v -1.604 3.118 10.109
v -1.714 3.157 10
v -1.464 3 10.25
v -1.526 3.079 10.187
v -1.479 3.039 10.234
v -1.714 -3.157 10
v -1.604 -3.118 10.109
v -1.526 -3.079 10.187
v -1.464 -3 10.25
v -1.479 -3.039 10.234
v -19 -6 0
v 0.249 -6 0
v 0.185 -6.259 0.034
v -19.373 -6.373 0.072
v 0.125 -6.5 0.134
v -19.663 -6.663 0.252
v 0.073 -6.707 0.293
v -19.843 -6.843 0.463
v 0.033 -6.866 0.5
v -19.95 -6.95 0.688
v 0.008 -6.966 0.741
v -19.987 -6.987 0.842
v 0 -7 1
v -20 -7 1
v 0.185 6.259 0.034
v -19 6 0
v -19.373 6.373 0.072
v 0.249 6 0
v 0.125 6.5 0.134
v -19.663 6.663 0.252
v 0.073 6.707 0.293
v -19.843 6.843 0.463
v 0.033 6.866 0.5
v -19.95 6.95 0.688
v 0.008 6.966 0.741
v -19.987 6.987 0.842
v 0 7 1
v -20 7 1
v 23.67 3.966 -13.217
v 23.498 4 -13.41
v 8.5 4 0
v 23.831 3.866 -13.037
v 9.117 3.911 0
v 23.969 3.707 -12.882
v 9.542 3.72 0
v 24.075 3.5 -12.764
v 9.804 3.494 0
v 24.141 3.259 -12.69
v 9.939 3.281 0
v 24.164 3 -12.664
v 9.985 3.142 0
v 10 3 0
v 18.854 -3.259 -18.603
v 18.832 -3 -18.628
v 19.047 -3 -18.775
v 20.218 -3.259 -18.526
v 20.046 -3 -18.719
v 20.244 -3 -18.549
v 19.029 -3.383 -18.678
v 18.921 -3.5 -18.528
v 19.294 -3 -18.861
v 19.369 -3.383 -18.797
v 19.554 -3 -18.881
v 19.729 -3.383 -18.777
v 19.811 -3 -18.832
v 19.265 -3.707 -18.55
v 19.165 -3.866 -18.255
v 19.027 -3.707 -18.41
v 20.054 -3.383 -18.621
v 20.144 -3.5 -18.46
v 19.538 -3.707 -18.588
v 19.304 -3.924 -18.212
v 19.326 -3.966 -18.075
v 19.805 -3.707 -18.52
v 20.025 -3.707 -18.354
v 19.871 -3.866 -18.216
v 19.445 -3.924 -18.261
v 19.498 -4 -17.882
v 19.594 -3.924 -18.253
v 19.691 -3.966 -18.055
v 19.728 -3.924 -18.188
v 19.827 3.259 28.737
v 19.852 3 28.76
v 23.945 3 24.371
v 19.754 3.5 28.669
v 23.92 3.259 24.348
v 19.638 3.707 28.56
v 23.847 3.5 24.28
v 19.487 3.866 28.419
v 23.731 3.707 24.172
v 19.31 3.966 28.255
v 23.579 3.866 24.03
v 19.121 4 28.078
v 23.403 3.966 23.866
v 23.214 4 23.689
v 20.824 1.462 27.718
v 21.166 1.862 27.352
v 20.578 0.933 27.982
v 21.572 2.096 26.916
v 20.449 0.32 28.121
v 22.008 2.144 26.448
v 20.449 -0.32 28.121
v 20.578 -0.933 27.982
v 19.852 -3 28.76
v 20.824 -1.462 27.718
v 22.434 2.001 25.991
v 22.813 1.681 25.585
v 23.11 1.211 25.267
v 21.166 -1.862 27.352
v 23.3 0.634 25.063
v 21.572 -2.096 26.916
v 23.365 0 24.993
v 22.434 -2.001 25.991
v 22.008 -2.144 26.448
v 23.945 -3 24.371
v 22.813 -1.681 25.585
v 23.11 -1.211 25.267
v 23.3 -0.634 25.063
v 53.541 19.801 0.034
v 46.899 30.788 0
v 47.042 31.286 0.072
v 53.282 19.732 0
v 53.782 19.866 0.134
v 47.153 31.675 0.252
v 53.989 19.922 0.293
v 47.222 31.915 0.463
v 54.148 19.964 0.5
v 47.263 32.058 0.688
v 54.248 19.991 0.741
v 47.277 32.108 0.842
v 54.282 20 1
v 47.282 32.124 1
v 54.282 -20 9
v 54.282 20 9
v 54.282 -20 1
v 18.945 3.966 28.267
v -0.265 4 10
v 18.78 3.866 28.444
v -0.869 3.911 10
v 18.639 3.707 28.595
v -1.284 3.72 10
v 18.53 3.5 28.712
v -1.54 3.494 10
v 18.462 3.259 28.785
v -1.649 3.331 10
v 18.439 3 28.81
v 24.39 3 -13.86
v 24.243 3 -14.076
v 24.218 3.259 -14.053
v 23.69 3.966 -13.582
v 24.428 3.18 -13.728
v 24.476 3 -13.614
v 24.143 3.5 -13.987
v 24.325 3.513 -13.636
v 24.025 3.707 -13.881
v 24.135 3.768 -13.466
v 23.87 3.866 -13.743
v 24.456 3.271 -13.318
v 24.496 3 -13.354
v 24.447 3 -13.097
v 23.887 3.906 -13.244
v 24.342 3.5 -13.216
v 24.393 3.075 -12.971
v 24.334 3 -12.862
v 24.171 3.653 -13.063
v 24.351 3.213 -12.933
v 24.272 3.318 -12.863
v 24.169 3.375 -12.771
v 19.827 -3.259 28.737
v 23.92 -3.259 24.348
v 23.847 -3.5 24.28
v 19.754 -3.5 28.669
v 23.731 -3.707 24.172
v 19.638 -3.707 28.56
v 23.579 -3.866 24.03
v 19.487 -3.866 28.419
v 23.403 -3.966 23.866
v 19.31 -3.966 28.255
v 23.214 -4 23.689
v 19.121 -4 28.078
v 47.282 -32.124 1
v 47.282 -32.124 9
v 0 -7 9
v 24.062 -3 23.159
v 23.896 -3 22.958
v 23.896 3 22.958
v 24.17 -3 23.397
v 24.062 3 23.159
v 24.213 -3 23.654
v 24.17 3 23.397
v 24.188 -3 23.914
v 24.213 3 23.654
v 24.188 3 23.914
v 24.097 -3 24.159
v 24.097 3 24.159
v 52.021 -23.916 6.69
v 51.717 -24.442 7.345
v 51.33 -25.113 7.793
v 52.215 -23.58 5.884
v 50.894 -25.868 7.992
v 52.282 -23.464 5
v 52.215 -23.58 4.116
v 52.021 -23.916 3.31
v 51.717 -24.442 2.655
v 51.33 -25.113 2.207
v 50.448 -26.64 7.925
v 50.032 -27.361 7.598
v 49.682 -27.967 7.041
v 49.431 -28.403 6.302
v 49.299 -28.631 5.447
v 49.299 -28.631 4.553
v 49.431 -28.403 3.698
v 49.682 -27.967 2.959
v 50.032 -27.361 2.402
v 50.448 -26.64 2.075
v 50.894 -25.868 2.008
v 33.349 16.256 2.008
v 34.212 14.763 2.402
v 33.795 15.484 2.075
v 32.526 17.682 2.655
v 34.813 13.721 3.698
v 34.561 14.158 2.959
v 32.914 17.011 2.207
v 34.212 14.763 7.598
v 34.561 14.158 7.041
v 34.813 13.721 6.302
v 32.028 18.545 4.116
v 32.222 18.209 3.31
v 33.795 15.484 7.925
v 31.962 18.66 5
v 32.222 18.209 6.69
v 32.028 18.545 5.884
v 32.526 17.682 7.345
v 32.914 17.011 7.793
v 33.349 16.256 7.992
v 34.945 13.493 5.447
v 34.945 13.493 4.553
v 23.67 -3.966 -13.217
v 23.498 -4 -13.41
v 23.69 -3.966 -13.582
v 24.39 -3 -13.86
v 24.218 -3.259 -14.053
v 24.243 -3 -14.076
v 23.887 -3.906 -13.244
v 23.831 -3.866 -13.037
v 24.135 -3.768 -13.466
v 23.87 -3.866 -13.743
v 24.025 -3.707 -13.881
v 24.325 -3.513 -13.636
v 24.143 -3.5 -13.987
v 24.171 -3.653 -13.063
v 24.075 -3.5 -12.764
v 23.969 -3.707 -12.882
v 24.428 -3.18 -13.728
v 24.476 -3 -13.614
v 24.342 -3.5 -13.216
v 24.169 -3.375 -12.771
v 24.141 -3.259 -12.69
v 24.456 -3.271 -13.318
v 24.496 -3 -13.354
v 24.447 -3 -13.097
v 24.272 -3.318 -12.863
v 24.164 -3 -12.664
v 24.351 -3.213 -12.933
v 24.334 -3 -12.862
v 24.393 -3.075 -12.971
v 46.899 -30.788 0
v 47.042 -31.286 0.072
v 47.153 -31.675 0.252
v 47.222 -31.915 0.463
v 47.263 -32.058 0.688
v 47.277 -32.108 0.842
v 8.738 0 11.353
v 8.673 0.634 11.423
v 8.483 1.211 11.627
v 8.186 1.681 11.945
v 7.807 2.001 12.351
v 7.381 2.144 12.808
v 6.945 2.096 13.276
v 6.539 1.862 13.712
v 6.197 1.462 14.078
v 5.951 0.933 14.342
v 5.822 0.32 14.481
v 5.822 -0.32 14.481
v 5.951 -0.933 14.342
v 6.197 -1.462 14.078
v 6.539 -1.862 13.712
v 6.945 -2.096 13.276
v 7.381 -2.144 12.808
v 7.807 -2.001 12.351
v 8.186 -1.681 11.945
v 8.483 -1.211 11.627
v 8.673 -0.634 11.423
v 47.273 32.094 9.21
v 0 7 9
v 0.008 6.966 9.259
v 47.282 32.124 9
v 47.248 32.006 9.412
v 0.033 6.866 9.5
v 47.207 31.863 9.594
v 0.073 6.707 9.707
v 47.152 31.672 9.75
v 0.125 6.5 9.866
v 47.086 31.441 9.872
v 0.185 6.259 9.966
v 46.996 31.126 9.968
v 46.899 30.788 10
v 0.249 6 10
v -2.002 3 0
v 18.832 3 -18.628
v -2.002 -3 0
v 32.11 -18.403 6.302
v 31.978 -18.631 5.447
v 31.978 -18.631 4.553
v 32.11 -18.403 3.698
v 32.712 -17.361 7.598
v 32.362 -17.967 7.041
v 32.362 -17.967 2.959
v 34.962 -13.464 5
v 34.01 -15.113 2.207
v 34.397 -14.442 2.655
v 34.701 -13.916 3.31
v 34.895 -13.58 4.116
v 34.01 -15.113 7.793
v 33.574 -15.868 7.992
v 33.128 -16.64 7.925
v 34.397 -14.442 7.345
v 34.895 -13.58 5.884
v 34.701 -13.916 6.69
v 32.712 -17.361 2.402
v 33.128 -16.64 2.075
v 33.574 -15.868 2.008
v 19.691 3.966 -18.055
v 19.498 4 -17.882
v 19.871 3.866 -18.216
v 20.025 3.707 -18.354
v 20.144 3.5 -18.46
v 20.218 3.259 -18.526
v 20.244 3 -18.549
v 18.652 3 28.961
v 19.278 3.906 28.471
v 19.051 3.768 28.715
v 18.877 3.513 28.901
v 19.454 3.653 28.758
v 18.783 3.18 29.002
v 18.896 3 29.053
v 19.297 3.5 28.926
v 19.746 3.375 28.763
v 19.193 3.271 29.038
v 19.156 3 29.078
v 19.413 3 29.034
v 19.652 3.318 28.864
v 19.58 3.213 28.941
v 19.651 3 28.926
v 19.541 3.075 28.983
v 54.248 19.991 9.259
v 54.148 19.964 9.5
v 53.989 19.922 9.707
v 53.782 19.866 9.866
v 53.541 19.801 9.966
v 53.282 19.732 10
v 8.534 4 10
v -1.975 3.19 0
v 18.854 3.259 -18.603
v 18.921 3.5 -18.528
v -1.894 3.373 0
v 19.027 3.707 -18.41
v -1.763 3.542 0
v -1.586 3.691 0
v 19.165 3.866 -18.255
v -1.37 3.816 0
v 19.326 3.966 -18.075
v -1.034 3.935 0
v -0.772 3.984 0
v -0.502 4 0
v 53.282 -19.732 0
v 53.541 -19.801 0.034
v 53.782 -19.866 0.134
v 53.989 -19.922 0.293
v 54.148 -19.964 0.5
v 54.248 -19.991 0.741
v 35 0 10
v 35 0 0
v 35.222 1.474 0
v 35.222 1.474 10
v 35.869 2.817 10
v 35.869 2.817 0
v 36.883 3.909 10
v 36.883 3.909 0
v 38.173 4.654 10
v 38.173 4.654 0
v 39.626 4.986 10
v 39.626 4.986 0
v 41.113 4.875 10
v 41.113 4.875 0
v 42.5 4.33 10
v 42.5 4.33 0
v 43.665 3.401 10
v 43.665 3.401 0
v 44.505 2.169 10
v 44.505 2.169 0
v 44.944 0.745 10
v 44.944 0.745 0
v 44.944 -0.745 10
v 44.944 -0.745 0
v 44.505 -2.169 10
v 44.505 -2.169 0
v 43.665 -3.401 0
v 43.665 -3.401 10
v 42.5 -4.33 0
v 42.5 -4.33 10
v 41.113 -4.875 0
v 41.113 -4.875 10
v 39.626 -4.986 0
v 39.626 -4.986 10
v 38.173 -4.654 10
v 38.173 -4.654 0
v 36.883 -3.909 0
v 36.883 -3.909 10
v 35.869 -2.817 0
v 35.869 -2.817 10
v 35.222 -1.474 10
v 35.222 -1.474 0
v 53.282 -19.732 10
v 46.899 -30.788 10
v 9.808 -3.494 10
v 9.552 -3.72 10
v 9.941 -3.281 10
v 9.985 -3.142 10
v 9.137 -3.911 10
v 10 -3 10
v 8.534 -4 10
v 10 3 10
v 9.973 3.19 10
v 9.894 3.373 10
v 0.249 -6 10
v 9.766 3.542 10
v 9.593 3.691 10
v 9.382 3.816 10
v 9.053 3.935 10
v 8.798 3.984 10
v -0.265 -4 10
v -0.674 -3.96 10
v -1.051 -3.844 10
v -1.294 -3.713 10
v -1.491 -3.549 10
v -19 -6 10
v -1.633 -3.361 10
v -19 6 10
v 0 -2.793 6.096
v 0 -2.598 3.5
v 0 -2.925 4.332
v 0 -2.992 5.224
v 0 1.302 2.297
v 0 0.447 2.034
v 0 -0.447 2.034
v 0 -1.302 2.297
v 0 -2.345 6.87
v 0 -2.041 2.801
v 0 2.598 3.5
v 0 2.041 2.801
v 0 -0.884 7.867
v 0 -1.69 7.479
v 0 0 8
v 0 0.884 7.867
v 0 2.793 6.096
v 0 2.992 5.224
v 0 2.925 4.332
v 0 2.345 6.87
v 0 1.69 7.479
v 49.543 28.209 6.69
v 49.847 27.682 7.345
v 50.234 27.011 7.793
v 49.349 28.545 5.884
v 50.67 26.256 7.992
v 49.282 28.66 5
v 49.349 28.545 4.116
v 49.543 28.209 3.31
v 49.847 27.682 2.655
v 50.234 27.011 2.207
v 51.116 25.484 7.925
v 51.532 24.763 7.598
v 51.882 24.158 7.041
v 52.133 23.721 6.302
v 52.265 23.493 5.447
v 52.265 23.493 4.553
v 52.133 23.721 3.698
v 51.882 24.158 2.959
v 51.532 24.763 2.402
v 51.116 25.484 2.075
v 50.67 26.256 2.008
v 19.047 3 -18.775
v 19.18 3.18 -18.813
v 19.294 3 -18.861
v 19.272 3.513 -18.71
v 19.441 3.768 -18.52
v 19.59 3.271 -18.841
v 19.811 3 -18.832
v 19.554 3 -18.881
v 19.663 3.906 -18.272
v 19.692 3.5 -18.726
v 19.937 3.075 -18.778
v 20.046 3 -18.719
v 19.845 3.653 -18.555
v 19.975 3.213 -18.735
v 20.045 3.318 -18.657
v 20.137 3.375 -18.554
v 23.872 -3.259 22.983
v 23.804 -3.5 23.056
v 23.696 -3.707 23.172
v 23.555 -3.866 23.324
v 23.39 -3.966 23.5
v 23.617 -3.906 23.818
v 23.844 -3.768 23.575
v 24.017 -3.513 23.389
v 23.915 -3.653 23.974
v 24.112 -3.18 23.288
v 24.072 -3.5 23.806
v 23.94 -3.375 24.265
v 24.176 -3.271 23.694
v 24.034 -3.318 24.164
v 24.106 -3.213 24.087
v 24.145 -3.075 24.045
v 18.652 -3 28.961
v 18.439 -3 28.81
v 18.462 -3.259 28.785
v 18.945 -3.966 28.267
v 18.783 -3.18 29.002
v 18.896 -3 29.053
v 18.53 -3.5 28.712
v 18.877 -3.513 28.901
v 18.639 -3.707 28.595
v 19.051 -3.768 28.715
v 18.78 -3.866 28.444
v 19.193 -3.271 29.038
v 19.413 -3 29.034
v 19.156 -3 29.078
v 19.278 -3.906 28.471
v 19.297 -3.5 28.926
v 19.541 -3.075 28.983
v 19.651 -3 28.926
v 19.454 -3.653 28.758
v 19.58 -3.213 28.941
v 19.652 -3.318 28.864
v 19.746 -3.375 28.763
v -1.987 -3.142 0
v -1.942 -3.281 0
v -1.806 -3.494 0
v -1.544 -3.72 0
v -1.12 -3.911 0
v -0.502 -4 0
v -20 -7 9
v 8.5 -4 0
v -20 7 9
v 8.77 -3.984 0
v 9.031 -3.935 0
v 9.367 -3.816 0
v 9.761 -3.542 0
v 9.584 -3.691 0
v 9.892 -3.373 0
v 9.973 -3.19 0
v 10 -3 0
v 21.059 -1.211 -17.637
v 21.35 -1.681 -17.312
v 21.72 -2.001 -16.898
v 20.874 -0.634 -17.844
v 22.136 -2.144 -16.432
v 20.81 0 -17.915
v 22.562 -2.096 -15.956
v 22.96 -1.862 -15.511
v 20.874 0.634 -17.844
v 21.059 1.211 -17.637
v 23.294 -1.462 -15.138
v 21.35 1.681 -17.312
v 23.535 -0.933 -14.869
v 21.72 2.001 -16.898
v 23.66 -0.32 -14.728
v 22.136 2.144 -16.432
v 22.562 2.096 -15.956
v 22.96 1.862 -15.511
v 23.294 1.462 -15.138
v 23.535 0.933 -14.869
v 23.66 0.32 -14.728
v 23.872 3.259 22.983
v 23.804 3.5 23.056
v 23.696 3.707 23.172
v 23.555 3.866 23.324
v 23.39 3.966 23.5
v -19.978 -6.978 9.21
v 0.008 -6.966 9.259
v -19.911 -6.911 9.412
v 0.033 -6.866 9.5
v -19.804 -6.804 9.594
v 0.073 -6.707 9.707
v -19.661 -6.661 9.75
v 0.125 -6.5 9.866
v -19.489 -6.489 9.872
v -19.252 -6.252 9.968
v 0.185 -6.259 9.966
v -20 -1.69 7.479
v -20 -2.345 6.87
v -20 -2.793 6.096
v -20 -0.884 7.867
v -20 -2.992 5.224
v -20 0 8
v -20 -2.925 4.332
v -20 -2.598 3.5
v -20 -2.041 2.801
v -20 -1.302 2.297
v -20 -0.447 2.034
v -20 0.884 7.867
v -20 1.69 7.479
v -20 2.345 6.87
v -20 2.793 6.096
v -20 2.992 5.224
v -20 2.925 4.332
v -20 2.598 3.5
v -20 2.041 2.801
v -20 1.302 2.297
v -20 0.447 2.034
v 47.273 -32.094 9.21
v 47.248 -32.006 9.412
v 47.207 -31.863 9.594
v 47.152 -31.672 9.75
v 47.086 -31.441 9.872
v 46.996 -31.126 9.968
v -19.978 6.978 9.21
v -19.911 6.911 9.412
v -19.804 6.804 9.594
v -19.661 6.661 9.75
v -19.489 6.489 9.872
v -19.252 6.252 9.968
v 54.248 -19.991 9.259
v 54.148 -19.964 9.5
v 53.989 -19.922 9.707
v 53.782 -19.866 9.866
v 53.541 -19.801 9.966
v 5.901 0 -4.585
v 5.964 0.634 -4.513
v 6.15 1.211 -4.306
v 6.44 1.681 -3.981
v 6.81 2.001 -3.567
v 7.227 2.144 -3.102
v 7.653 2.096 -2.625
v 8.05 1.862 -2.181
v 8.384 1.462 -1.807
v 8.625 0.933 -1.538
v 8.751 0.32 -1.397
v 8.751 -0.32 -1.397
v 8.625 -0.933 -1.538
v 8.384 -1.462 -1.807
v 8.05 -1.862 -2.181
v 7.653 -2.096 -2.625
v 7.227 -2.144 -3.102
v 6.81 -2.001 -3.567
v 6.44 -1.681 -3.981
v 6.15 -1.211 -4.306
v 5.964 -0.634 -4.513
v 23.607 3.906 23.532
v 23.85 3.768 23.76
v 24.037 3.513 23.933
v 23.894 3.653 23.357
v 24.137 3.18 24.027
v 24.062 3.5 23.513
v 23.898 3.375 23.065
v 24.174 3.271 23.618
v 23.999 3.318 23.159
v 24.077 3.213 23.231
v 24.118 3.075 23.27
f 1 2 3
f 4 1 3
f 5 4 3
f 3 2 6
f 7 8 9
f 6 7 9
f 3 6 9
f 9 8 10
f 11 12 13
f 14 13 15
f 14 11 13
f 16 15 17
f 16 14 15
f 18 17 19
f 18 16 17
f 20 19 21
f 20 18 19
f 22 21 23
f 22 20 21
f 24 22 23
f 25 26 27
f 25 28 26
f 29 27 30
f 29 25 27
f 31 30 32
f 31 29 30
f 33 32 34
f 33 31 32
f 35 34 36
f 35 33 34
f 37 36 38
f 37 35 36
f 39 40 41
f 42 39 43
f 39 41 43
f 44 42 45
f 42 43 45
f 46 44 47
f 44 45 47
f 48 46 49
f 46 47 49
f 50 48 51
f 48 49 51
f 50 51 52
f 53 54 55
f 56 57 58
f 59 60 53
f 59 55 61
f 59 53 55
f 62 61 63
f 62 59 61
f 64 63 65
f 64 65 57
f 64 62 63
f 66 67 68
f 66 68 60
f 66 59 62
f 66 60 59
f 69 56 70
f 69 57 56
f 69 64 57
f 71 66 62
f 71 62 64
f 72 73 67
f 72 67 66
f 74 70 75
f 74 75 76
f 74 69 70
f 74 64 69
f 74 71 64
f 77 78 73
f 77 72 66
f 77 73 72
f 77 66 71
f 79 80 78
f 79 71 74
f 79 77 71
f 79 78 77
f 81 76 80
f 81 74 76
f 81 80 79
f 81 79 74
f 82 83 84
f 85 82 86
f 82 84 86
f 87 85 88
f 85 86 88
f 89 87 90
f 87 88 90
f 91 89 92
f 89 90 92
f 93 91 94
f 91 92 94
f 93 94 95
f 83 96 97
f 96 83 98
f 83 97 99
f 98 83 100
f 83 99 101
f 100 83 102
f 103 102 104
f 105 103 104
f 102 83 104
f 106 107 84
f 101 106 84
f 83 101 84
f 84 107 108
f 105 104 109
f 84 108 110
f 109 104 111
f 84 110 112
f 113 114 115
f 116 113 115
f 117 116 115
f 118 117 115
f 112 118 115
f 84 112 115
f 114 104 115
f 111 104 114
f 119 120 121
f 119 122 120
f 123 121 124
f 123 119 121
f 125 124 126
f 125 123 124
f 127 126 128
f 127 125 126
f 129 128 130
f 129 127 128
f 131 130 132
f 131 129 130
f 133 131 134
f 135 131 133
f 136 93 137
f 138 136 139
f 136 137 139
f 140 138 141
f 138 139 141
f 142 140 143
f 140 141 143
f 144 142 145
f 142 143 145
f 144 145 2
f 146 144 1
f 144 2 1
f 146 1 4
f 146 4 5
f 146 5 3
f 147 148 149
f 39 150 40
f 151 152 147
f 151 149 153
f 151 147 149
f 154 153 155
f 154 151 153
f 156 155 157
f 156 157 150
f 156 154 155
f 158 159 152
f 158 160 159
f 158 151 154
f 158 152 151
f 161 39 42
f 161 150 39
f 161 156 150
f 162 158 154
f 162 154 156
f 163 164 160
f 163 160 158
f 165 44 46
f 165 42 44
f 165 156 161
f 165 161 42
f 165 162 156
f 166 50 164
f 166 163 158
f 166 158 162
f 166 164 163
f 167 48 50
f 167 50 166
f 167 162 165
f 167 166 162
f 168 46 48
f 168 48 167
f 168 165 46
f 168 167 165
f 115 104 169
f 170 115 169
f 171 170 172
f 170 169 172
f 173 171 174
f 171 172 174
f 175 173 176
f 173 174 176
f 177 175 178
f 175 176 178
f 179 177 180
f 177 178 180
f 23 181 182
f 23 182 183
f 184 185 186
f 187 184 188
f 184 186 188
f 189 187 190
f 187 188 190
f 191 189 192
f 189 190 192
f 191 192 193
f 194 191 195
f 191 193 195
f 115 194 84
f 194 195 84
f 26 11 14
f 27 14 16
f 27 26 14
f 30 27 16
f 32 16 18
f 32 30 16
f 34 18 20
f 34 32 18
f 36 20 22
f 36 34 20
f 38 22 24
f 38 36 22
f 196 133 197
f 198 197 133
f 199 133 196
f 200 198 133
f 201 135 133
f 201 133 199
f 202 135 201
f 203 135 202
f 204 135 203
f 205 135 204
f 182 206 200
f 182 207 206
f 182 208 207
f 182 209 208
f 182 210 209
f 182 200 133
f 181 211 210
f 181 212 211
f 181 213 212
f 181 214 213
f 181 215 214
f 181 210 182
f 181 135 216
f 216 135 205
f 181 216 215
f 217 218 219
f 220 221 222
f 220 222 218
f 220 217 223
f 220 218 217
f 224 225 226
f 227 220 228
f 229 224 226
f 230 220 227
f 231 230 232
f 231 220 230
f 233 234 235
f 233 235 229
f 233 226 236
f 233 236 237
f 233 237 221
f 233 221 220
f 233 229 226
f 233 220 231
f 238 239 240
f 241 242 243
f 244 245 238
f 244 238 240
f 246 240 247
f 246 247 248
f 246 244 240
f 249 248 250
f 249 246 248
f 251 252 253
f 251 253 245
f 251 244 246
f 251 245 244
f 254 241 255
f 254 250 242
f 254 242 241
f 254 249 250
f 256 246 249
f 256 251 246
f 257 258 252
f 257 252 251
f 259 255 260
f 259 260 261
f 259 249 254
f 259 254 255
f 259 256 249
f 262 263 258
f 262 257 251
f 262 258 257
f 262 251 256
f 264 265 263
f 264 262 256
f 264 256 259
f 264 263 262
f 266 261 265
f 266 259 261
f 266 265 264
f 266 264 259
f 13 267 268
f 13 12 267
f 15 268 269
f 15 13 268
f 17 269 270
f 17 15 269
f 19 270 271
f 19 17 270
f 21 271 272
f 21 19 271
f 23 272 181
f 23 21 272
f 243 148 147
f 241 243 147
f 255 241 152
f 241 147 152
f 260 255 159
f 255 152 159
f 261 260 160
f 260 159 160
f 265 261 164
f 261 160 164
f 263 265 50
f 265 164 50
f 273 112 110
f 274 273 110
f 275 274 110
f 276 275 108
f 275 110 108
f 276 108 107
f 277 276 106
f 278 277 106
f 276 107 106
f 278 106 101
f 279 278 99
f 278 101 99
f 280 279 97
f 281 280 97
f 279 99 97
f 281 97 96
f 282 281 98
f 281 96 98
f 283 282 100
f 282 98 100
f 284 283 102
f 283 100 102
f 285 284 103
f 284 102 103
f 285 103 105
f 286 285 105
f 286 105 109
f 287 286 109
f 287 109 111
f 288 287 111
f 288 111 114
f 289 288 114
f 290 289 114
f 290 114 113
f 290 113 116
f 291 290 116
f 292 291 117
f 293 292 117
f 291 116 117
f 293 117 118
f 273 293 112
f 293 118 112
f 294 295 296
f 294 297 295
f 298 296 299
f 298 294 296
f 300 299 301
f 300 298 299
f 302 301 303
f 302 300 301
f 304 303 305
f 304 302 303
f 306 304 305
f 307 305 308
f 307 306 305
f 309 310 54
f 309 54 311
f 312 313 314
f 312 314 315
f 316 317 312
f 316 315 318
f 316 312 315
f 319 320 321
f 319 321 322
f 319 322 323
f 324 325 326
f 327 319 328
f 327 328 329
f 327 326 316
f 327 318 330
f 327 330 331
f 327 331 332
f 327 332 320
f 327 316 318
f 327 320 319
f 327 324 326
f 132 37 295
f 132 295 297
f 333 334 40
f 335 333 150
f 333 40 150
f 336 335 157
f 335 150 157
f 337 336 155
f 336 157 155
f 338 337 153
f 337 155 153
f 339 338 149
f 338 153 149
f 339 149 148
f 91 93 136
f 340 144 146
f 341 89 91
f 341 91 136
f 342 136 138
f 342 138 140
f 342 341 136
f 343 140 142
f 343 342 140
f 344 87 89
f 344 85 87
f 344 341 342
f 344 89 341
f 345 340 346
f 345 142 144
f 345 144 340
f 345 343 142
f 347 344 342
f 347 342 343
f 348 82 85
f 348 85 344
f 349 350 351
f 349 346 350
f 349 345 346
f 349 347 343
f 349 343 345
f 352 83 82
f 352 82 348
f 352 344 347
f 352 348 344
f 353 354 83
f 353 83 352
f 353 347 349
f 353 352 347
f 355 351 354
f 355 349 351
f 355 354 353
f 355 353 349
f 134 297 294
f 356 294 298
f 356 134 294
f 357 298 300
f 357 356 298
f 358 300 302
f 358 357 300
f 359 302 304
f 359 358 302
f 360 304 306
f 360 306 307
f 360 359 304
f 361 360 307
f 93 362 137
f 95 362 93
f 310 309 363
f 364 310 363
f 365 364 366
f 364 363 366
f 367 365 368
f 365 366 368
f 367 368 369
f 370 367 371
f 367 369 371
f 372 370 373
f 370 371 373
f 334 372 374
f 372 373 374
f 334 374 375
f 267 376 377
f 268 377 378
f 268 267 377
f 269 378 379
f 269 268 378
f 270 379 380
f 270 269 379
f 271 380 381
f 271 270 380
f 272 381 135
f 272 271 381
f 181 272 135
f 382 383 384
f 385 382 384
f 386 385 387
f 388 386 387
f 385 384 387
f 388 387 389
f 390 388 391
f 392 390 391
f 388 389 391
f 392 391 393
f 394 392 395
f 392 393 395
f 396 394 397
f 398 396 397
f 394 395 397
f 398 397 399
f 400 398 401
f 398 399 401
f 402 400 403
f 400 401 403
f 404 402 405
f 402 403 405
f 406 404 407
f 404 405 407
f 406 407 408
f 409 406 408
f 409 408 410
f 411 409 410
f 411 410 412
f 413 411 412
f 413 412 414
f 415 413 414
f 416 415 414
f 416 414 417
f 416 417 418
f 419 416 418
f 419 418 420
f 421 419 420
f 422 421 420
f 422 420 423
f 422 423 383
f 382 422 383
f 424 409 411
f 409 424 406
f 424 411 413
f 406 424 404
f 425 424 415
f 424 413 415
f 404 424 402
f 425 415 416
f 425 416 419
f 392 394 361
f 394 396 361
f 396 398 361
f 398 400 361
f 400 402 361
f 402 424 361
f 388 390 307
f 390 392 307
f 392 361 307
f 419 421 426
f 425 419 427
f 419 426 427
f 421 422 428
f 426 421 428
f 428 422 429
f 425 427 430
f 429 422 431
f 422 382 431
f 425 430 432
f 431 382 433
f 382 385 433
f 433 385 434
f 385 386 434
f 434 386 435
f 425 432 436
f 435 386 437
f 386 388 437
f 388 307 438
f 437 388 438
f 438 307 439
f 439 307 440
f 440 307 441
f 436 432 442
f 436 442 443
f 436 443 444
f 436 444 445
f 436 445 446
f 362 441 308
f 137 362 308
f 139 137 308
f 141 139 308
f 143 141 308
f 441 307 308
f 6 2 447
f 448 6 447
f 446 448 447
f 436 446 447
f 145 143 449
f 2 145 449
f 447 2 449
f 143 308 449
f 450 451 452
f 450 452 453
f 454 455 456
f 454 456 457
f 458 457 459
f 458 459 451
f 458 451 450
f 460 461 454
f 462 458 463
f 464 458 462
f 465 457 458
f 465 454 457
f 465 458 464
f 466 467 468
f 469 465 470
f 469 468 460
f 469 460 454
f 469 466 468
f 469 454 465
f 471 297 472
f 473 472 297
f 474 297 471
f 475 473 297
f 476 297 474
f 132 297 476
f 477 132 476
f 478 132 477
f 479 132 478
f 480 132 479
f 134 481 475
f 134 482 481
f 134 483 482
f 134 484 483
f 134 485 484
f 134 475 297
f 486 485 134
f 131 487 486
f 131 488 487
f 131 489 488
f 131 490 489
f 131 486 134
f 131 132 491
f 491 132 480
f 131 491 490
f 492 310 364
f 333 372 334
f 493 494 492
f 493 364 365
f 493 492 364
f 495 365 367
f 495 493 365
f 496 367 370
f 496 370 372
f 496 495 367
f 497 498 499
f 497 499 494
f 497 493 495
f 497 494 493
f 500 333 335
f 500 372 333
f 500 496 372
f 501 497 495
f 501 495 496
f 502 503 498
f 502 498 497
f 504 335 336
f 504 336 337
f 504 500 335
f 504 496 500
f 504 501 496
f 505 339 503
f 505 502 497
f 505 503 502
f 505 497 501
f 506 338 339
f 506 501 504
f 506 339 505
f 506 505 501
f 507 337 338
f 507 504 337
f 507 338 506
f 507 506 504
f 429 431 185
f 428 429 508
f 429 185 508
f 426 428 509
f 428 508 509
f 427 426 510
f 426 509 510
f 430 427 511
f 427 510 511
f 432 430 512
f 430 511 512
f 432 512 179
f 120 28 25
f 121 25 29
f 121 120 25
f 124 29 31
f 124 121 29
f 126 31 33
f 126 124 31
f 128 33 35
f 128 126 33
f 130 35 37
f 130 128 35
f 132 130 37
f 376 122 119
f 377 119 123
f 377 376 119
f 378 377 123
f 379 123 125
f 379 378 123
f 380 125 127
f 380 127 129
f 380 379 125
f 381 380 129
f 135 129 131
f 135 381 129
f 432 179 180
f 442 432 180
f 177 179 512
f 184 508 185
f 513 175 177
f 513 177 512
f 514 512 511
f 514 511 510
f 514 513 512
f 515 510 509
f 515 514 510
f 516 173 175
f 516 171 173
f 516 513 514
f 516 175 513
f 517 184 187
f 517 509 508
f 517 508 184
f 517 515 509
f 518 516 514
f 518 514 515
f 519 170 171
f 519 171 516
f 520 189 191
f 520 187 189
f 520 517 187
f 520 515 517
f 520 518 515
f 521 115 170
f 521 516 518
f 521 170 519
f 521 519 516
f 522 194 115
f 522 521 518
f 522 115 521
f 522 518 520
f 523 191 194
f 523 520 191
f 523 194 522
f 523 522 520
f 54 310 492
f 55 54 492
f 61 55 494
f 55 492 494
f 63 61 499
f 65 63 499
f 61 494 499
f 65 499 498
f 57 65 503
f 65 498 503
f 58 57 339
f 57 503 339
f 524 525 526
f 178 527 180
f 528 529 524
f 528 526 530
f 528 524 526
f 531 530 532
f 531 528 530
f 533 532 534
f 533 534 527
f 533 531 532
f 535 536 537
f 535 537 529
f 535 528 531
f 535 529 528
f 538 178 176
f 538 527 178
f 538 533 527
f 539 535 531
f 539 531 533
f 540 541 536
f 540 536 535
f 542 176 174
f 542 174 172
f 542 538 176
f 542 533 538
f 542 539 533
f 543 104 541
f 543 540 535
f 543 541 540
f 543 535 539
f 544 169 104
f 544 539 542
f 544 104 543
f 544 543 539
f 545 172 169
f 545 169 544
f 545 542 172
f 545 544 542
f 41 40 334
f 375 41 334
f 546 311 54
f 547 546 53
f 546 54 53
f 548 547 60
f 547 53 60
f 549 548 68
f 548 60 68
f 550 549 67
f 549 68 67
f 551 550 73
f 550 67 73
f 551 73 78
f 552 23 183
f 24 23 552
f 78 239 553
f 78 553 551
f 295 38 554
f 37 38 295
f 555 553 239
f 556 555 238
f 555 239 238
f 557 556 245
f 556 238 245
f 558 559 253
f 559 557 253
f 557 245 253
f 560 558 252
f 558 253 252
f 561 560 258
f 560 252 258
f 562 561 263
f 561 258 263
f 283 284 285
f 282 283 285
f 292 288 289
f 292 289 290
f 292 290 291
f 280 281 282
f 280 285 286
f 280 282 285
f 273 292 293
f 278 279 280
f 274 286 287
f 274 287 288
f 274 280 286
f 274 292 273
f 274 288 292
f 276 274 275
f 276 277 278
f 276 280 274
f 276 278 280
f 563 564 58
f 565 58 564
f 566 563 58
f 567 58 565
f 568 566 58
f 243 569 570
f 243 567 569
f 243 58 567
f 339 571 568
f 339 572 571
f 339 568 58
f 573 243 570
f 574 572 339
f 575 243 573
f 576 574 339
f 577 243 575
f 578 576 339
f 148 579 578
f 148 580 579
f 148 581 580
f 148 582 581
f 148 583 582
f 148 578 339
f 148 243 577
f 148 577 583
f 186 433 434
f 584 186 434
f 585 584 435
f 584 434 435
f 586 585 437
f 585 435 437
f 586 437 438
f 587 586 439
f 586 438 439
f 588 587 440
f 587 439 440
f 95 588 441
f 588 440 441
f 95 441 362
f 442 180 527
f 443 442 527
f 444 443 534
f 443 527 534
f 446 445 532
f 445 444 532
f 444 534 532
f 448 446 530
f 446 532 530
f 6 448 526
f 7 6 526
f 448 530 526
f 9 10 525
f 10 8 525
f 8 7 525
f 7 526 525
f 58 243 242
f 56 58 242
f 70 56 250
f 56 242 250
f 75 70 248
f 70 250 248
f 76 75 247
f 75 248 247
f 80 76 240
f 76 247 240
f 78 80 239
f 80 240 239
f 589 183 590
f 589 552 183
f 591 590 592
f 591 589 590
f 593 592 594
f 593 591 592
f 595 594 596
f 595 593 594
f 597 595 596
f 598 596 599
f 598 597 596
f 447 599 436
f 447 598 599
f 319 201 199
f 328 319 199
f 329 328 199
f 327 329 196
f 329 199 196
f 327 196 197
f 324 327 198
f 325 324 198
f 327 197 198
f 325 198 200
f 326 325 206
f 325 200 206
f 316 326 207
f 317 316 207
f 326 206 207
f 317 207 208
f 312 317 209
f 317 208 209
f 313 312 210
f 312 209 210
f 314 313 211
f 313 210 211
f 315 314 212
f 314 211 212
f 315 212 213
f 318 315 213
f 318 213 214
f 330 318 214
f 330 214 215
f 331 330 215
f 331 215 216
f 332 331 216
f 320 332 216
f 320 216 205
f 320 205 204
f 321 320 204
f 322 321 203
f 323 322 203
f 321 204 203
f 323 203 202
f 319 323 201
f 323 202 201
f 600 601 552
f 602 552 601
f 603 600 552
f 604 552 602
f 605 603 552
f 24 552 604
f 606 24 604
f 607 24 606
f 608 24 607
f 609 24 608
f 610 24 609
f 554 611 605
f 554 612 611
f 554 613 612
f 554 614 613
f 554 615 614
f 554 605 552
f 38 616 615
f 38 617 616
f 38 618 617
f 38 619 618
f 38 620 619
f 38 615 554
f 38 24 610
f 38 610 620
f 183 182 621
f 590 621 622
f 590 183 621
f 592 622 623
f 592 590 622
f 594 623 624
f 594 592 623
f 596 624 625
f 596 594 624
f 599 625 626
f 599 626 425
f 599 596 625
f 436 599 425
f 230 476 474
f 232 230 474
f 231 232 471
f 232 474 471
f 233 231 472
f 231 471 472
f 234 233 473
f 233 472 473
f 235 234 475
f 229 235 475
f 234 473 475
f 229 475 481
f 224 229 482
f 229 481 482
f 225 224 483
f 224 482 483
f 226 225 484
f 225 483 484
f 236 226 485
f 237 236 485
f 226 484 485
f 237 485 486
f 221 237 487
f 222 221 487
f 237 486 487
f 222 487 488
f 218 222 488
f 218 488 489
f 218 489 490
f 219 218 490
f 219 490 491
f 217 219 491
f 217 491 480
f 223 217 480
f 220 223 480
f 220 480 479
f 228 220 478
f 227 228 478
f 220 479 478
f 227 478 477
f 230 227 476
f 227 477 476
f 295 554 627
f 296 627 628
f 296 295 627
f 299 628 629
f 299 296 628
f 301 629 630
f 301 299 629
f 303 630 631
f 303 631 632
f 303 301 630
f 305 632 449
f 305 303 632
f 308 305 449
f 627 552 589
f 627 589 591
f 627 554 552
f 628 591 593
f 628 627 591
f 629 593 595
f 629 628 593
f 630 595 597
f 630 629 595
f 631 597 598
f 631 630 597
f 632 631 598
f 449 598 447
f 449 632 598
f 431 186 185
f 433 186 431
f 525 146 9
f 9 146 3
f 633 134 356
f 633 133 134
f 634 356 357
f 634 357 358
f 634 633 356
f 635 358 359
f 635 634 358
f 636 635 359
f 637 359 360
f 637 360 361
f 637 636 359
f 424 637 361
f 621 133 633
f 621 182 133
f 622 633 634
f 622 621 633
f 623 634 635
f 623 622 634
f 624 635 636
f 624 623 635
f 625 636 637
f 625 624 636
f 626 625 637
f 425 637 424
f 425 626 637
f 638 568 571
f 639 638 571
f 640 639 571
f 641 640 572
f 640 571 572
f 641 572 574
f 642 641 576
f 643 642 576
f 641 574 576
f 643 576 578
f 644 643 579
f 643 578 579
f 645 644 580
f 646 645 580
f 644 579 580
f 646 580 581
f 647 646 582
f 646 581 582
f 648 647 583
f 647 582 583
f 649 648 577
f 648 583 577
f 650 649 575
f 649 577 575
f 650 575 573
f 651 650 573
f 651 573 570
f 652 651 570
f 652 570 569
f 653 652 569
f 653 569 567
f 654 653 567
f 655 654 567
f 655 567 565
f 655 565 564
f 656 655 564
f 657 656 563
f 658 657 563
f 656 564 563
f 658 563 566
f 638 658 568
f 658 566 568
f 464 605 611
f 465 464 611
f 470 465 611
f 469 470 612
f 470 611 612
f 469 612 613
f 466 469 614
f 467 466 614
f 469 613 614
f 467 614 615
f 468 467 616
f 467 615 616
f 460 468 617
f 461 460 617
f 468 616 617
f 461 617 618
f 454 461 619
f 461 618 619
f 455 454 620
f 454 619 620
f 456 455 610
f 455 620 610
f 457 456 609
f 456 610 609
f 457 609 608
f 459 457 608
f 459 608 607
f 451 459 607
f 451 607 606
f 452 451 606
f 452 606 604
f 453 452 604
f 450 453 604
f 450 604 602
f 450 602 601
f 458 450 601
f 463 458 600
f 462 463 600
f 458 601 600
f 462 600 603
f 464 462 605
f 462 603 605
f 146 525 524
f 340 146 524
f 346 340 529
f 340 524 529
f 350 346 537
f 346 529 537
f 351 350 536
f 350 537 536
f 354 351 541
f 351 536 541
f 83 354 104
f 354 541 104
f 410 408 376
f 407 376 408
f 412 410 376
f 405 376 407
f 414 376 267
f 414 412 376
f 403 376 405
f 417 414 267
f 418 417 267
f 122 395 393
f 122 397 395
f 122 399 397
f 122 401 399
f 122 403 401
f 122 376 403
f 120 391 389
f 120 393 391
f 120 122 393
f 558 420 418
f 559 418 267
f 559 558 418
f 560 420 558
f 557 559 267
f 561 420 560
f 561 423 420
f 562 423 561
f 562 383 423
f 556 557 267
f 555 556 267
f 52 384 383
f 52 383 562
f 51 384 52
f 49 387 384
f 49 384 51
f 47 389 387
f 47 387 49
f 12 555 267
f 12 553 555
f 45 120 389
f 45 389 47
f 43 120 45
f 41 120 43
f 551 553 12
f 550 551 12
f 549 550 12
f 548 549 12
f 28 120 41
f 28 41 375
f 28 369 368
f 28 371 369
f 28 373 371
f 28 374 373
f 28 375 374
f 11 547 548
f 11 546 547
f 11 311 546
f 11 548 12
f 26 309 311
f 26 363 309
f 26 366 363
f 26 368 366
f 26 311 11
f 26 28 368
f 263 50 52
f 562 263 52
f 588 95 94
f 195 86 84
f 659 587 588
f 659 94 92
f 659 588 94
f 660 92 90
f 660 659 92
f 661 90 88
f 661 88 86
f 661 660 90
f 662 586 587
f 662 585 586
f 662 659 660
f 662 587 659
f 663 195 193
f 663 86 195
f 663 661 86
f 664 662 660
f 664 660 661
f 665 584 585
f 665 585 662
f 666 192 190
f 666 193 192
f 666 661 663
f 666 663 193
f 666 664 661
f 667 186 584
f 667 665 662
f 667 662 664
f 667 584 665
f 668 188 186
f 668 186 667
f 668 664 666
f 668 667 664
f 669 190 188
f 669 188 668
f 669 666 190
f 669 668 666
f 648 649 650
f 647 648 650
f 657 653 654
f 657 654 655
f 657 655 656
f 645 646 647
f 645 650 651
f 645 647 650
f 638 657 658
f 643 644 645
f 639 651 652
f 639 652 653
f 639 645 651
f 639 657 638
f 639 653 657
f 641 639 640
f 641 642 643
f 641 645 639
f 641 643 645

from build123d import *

# Parameters (mm, degrees)
BOSS_EXTRU_2_DEPTH       = 10
ESQUISSE6_R              = 3
ENL_V_MAT_EXTRU_4_DEPTH  = 20
ESQUISSE7_R              = 3
ENL_V_MAT_EXTRU_5_DEPTH  = 20
ESQUISSE8_R              = 5
ENL_V_MAT_EXTRU_6_DEPTH  = 20
BOSS_EXTRU_3_DEPTH       = 10.94
ENL_V_MAT_EXTRU_9_DEPTH  = 10
ESQUISSE14_W             = 21.055359181
ESQUISSE14_H             = 15.627906255
ENL_V_MAT_EXTRU_10_DEPTH = 10
ESQUISSE15_R             = 2.15
ENL_V_MAT_EXTRU_11_DEPTH = 20
ESQUISSE19_W             = 45
ESQUISSE19_H             = 8
BOSS_EXTRU_6_DEPTH       = 8
ENL_V_MAT_EXTRU_13_DEPTH = 8
ESQUISSE21_R             = 2.15
ENL_V_MAT_EXTRU_14_DEPTH = 20
ESQUISSE4_R              = 3
ENL_V_MAT_EXTRU_3_DEPTH  = 20
CONG_1_R                 = 1
CONG_2_R                 = 1


with BuildPart() as part:
    # Esquisse1 → Boss.-Extru.2 (new body)
    with BuildSketch(Plane.XY):
        Polygon((-20, -7), (-20, 7), (0, 7), (47.282032303, 32.124355653), (54.282032303, 20), (54.282032303, -20), (47.282032303, -32.124355653), (0, -7), align=None)
    extrude(amount=BOSS_EXTRU_2_DEPTH)

    # Esquisse6 → Enlèv. mat.-Extru.4 (cut)
    with BuildSketch(Plane(origin=(49.371778265, 28.504809472, 0), x_dir=(0.4999999999999953, -0.8660254037844415, 0), z_dir=(0.8660254037844415, 0.4999999999999953, 0))):
        with Locations(Location((2.820508076, -5, 0), (0, 0, 180))):
            Circle(ESQUISSE6_R)
    extrude(amount=-ENL_V_MAT_EXTRU_4_DEPTH, mode=Mode.SUBTRACT)

    # Esquisse7 → Enlèv. mat.-Extru.5 (cut)
    with BuildSketch(Plane(origin=(49.371778265, -28.504809472, 0), x_dir=(-0.5000000000000256, -0.8660254037844237, 0), z_dir=(0.8660254037844238, -0.5000000000000258, 0))):
        with Locations(Location((-2.820508076, -5, 0), (0, 0, 180))):
            Circle(ESQUISSE7_R)
    extrude(amount=-ENL_V_MAT_EXTRU_5_DEPTH, mode=Mode.SUBTRACT)

    # Esquisse8 → Enlèv. mat.-Extru.6 (cut)
    with BuildSketch(Plane(origin=(0, 0, 0), x_dir=(-1, 0, 0), z_dir=(0, 0, -1))):
        with Locations((-40, 0)):
            Circle(ESQUISSE8_R)
    extrude(amount=-ENL_V_MAT_EXTRU_6_DEPTH, mode=Mode.SUBTRACT)

    # Esquisse3D2 → Boss.-Extru.3 (add, along a direction that is not the sketch's normal)
    with BuildSketch(Plane(origin=(-11.940611049, 4, -10.459950802), x_dir=(0.7221683612814543, -0.15799050110667315, 0.6734328916262713), z_dir=(-0.6819983600624996, 0, 0.7313537016191696))):
        Polygon((0, 0), (49.372031596, 7.899525055), (50.635955605, 0), (1.263924009, -7.899525055), align=None)
    extrude(amount=BOSS_EXTRU_3_DEPTH, dir=(0, 0, 1))

    # Esquisse11 → Enlèv. mat.-Extru.9 (cut)
    with BuildSketch(Plane(origin=(0, -4, 0), x_dir=(-1, 0, 0), z_dir=(0, -1, 0))):
        Polygon((-19.170398677, -29.491535113), (-24.627074032, -23.639967201), (-24.627074032, -34.579967201), (-21.088649198, -31.280332662), align=None)
    extrude(amount=-ENL_V_MAT_EXTRU_9_DEPTH, mode=Mode.SUBTRACT)

    # Esquisse14 → Enlèv. mat.-Extru.10 (cut)
    with BuildSketch(Plane(origin=(0, -4, 0), x_dir=(-1, 0, 0), z_dir=(0, -1, 0))):
        with Locations((1.412931459, 7.813953128)):
            Rectangle(ESQUISSE14_W, ESQUISSE14_H)
    extrude(amount=-ENL_V_MAT_EXTRU_10_DEPTH, mode=Mode.SUBTRACT)

    # Esquisse15 → Enlèv. mat.-Extru.11 (cut)
    with BuildSketch(Plane(origin=(24.963676652, 0, 23.279005084), x_dir=(0.6819983600624997, 0, -0.7313537016191695), z_dir=(0.7313537016191695, 0, 0.6819983600624997))):
        with Locations((-4.494058163, 0)):
            Circle(ESQUISSE15_R)
    extrude(amount=-ENL_V_MAT_EXTRU_11_DEPTH, mode=Mode.SUBTRACT)

    # Esquisse19 → Boss.-Extru.6 (add)
    with BuildSketch(Plane(origin=(4.442655339, 0, 4.968839596), x_dir=(-0.7454759996828609, 0, 0.6665324702494538), z_dir=(-0.6665324702494538, 0, -0.7454759996828609))):
        with Locations((-4.954759997, 0)):
            Rectangle(ESQUISSE19_W, ESQUISSE19_H)
    extrude(amount=BOSS_EXTRU_6_DEPTH)

    # Esquisse20 → Enlèv. mat.-Extru.13 (cut)
    with BuildSketch(Plane(origin=(0, -4, 0), x_dir=(-1, 0, 0), z_dir=(0, -1, 0))):
        Polygon((8.636899992, -16.663311756), (13.969159754, -10.699503759), (13.186807375, -10), (1.71363405, -10), (1.463807332, -10.249826718), align=None)
    extrude(amount=-ENL_V_MAT_EXTRU_13_DEPTH, mode=Mode.SUBTRACT)

    # Esquisse21 → Enlèv. mat.-Extru.14 (cut)
    with BuildSketch(Plane(origin=(20.466864655, 0, -18.299489001), x_dir=(-0.6665324702494541, 0, -0.7454759996828608), z_dir=(0.7454759996828608, 0, -0.6665324702494541))):
        with Locations((-2.665324702, 0)):
            Circle(ESQUISSE21_R)
    extrude(amount=-ENL_V_MAT_EXTRU_14_DEPTH, mode=Mode.SUBTRACT)

    # Esquisse4 → Enlèv. mat.-Extru.3 (cut)
    with BuildSketch(Plane.ZY.offset(20)):
        with Locations((5, 0)):
            Circle(ESQUISSE4_R)
    extrude(amount=-ENL_V_MAT_EXTRU_3_DEPTH, mode=Mode.SUBTRACT)

    # Congé1
    # the kernel refuses this fillet: 1 mm, written as the material it takes off along each edge
    with BuildSketch(Plane(origin=(23.497511524, 3, -13.409592934), x_dir=(0, 1, 0), z_dir=(0.666532470249454, 0, 0.745475999682861))) as cong_1_piece_1_section:
        Polygon((0, 0), (CONG_1_R, 0), (CONG_1_R, -CONG_1_R), (0, -CONG_1_R), align=None)
    cong_1_piece_1 = extrude(amount=CONG_1_R, mode=Mode.PRIVATE)
    cong_1_piece_1 = cong_1_piece_1 - Plane(origin=(23.497511524, 3, -13.409592934), x_dir=(-0.5271311345875715, -0.7071067811865474, 0.4713096295944097), z_dir=(0.666532470249454, 0, 0.745475999682861)) * Sphere(CONG_1_R, mode=Mode.PRIVATE)
    add(cong_1_piece_1, mode=Mode.SUBTRACT)
    with BuildSketch(Plane(origin=(23.497511524, -3, -13.409592934), x_dir=(0, -1, 0), z_dir=(0.666532470249454, 0, 0.745475999682861))) as cong_1_piece_2_section:
        Polygon((0, 0), (CONG_1_R, 0), (CONG_1_R, CONG_1_R), (0, CONG_1_R), align=None)
    cong_1_piece_2 = extrude(amount=CONG_1_R, mode=Mode.PRIVATE)
    cong_1_piece_2 = cong_1_piece_2 - Plane(origin=(23.497511524, -3, -13.409592934), x_dir=(-0.5271311345875714, 0.7071067811865476, 0.4713096295944094), z_dir=(0.666532470249454, 0, 0.745475999682861)) * Sphere(CONG_1_R, mode=Mode.PRIVATE)
    add(cong_1_piece_2, mode=Mode.SUBTRACT)
    with BuildSketch(Plane(origin=(19.498316702, 3, -17.882448933), x_dir=(-0.666532470249454, 0, -0.745475999682861), z_dir=(0.7454759996828609, 0, -0.6665324702494538))) as cong_1_piece_3_section:
        Polygon((0, 0), (CONG_1_R, 0), (CONG_1_R, CONG_1_R), (0, CONG_1_R), align=None)
    cong_1_piece_3 = extrude(amount=CONG_1_R, mode=Mode.PRIVATE)
    cong_1_piece_3 = cong_1_piece_3 - Plane(origin=(19.498316702, 3, -17.882448933), x_dir=(0.47130962959440953, -0.7071067811865474, 0.5271311345875718), z_dir=(0.7454759996828609, 0, -0.6665324702494538)) * Sphere(CONG_1_R, mode=Mode.PRIVATE)
    add(cong_1_piece_3, mode=Mode.SUBTRACT)
    with BuildSketch(Plane(origin=(19.498316702, -3, -17.882448933), x_dir=(-0.666532470249454, 0, -0.745475999682861), z_dir=(0, -1, 0))) as cong_1_piece_4_section:
        Polygon((0, 0), (CONG_1_R, 0), (CONG_1_R, CONG_1_R), (0, CONG_1_R), align=None)
    cong_1_piece_4 = extrude(amount=CONG_1_R, mode=Mode.PRIVATE)
    cong_1_piece_4 = cong_1_piece_4 - Plane(origin=(19.498316702, -3, -17.882448933), x_dir=(-0.05582150499316189, 0, 0.9984407641819811), z_dir=(0, -1, 0)) * Sphere(CONG_1_R, mode=Mode.PRIVATE)
    add(cong_1_piece_4, mode=Mode.SUBTRACT)
    with BuildSketch(Plane(origin=(19.121043336, -3, 28.078183051), x_dir=(-0.6819983600624996, 0, 0.7313537016191696), z_dir=(0.7313537016191692, 0, 0.6819983600624999))) as cong_1_piece_5_section:
        Polygon((0, 0), (CONG_1_R, 0), (CONG_1_R, CONG_1_R), (0, CONG_1_R), align=None)
    cong_1_piece_5 = extrude(amount=CONG_1_R, mode=Mode.PRIVATE)
    cong_1_piece_5 = cong_1_piece_5 - Plane(origin=(19.121043336, -3, 28.078183051), x_dir=(0.482245665158298, 0.7071067811865476, -0.5171451618607975), z_dir=(0.7313537016191692, 0, 0.6819983600624999)) * Sphere(CONG_1_R, mode=Mode.PRIVATE)
    add(cong_1_piece_5, mode=Mode.SUBTRACT)
    with BuildSketch(Plane(origin=(19.121043336, 3, 28.078183051), x_dir=(-0.6819983600624996, 0, 0.7313537016191696), z_dir=(0.7313537016191692, 0, 0.6819983600624999))) as cong_1_piece_6_section:
        Polygon((0, 0), (CONG_1_R, 0), (CONG_1_R, -CONG_1_R), (0, -CONG_1_R), align=None)
    cong_1_piece_6 = extrude(amount=CONG_1_R, mode=Mode.PRIVATE)
    cong_1_piece_6 = cong_1_piece_6 - Plane(origin=(19.121043336, 3, 28.078183051), x_dir=(0.4822456651582982, -0.7071067811865472, -0.5171451618607977), z_dir=(0.7313537016191692, 0, 0.6819983600624999)) * Sphere(CONG_1_R, mode=Mode.PRIVATE)
    add(cong_1_piece_6, mode=Mode.SUBTRACT)
    with BuildSketch(Plane(origin=(23.213721971, -3, 23.689322543), x_dir=(0.6819983600624996, 0, -0.7313537016191696), z_dir=(0.7313537016191692, 0, 0.6819983600624999))) as cong_1_piece_7_section:
        Polygon((0, 0), (CONG_1_R, 0), (CONG_1_R, -CONG_1_R), (0, -CONG_1_R), align=None)
    cong_1_piece_7 = extrude(amount=CONG_1_R, mode=Mode.PRIVATE)
    cong_1_piece_7 = cong_1_piece_7 - Plane(origin=(23.213721971, -3, 23.689322543), x_dir=(-0.4822456651582982, 0.7071067811865472, 0.5171451618607977), z_dir=(0.7313537016191692, 0, 0.6819983600624999)) * Sphere(CONG_1_R, mode=Mode.PRIVATE)
    add(cong_1_piece_7, mode=Mode.SUBTRACT)
    with BuildSketch(Plane(origin=(23.213721971, 3, 23.689322543), x_dir=(0.7313537016191692, 0, 0.6819983600624999), z_dir=(0.6819983600624996, 0, -0.7313537016191696))) as cong_1_piece_8_section:
        Polygon((0, 0), (CONG_1_R, 0), (CONG_1_R, -CONG_1_R), (0, -CONG_1_R), align=None)
    cong_1_piece_8 = extrude(amount=CONG_1_R, mode=Mode.PRIVATE)
    cong_1_piece_8 = cong_1_piece_8 - Plane(origin=(23.213721971, 3, 23.689322543), x_dir=(-0.5171451618607974, -0.7071067811865475, -0.48224566515829836), z_dir=(0.6819983600624996, 0, -0.7313537016191696)) * Sphere(CONG_1_R, mode=Mode.PRIVATE)
    add(cong_1_piece_8, mode=Mode.SUBTRACT)
    with BuildSketch(Plane(origin=(24.909519994, 3, -13.330649405), x_dir=(-0.7454759996828614, 0, 0.6665324702494536), z_dir=(0, -1, 0)), Plane(origin=(24.242987523, -4, -14.076125405), x_dir=(-0.7454759996828609, 0, 0.666532470249454), z_dir=(-0.666532470249454, 0, -0.745475999682861)), Plane(origin=(19.170398677, -3, 29.491535113), x_dir=(0.6819983600624999, 0, -0.7313537016191692), z_dir=(0, 1, 0))) as cong_1_piece_9:
        with BuildLine():
            CenterArc((CONG_1_R, CONG_1_R), CONG_1_R, 180, 90)
            Line((0, CONG_1_R), (0, 0))
            Line((0, 0), (CONG_1_R, 0))
        make_face()
    extrude(amount=6, mode=Mode.SUBTRACT)
    with BuildSketch(Plane(origin=(24.242987523, 4, -14.076125405), x_dir=(-0.745475999682861, 0, 0.6665324702494538), z_dir=(-0.666532470249454, 0, -0.745475999682861)), Plane(origin=(19.577260232, 3, -19.294457402), x_dir=(-0.7454759996828622, 0, 0.6665324702494525), z_dir=(0, -1, 0)), Plane(origin=(24.627074032, 3, 23.639967201), x_dir=(-0.7313537016191676, 0, -0.6819983600625017), z_dir=(0, -1, 0))) as cong_1_piece_10:
        with BuildLine():
            CenterArc((CONG_1_R, -CONG_1_R), CONG_1_R, 90, 90)
            Line((0, -CONG_1_R), (0, 0))
            Line((0, 0), (CONG_1_R, 0))
        make_face()
    extrude(amount=6, mode=Mode.SUBTRACT)
    with BuildSketch(Plane(origin=(19.852397038, -4, 28.760181411), x_dir=(-0.7313537016191692, 0, -0.6819983600624998), z_dir=(0.6819983600624999, 0, -0.7313537016191692)), Plane(origin=(23.945075672, 4, 24.371320903), x_dir=(-0.7313537016191692, 0, -0.6819983600624999), z_dir=(-0.6819983600624999, 0, 0.7313537016191692))) as cong_1_piece_11:
        with BuildLine():
            CenterArc((CONG_1_R, CONG_1_R), CONG_1_R, 180, 90)
            Line((0, CONG_1_R), (0, 0))
            Line((0, 0), (CONG_1_R, 0))
        make_face()
    extrude(amount=6.001009496, mode=Mode.SUBTRACT)
    with BuildSketch(Plane(origin=(23.895720331, -4, 22.957968841), x_dir=(0, 1, 0), z_dir=(-0.7313537016191696, 0, -0.6819983600624996))) as cong_1_piece_12_section:
        with BuildLine():
            CenterArc((CONG_1_R, -CONG_1_R), CONG_1_R, 90, 90)
            Line((0, -CONG_1_R), (0, 0))
            Line((0, 0), (CONG_1_R, 0))
        make_face()
    cong_1_piece_12 = extrude(amount=21.5, mode=Mode.PRIVATE)
    cong_1_piece_12 = split(cong_1_piece_12, bisect_by=Plane(origin=(16.701898304, -3.775135003, 10), z_dir=(0, 0, 1)), keep=Keep.TOP, mode=Mode.PRIVATE)
    add(cong_1_piece_12, mode=Mode.SUBTRACT)
    with BuildSketch(Plane(origin=(18.439044976, -4, 28.809536753), x_dir=(0.6819983600624996, -1.776356839400248e-15, -0.7313537016191696), z_dir=(-0.7313537016191696, 0, -0.6819983600624996))) as cong_1_piece_13_section:
        with BuildLine():
            CenterArc((CONG_1_R, -CONG_1_R), CONG_1_R, 90, 90)
            Line((0, -CONG_1_R), (0, 0))
            Line((0, 0), (CONG_1_R, 0))
        make_face()
    cong_1_piece_13 = extrude(amount=29.713716515, mode=Mode.PRIVATE)
    cong_1_piece_13 = split(cong_1_piece_13, bisect_by=Plane(origin=(8.594887091, -3.772527831, 10), z_dir=(0, 0, 1)), keep=Keep.TOP, mode=Mode.PRIVATE)
    add(cong_1_piece_13, mode=Mode.SUBTRACT)
    with BuildSketch(Plane(origin=(-3.292191586, 4, 8.544830818), x_dir=(0.6819983600624996, 0, -0.7313537016191696), z_dir=(0.7313537016191696, 0, 0.6819983600624996))) as cong_1_piece_14_section:
        with BuildLine():
            CenterArc((CONG_1_R, -CONG_1_R), CONG_1_R, 90, 90)
            Line((0, -CONG_1_R), (0, 0))
            Line((0, 0), (CONG_1_R, 0))
        make_face()
    cong_1_piece_14 = extrude(amount=29.713716515, mode=Mode.PRIVATE)
    cong_1_piece_14 = split(cong_1_piece_14, bisect_by=Plane(origin=(8.594887091, 3.772527831, 10), z_dir=(0, 0, 1)), keep=Keep.TOP, mode=Mode.PRIVATE)
    add(cong_1_piece_14, mode=Mode.SUBTRACT)
    with BuildSketch(Plane(origin=(8.171615746, 4, 8.2950041), x_dir=(0, -1, 0), z_dir=(0.7313537016191696, 0, 0.6819983600624996))) as cong_1_piece_15_section:
        with BuildLine():
            CenterArc((CONG_1_R, -CONG_1_R), CONG_1_R, 90, 90)
            Line((0, -CONG_1_R), (0, 0))
            Line((0, 0), (CONG_1_R, 0))
        make_face()
    cong_1_piece_15 = extrude(amount=21.5, mode=Mode.PRIVATE)
    cong_1_piece_15 = split(cong_1_piece_15, bisect_by=Plane(origin=(16.701898304, 3.775135003, 10), z_dir=(0, 0, 1)), keep=Keep.TOP, mode=Mode.PRIVATE)
    add(cong_1_piece_15, mode=Mode.SUBTRACT)
    with BuildSketch(Plane(origin=(24.164043994, -4, -12.664116935), x_dir=(0, 1, 0), z_dir=(-0.7454759996828609, 0, 0.6665324702494538))) as cong_1_piece_16_section:
        with BuildLine():
            CenterArc((CONG_1_R, CONG_1_R), CONG_1_R, 180, 90)
            Line((0, CONG_1_R), (0, 0))
            Line((0, 0), (CONG_1_R, 0))
        make_face()
    cong_1_piece_16 = extrude(amount=21.5, mode=Mode.PRIVATE)
    cong_1_piece_16 = split(cong_1_piece_16, bisect_by=Plane(origin=(16.833816535, -3.775199875, 0), z_dir=(0, 0, -1)), keep=Keep.TOP, mode=Mode.PRIVATE)
    add(cong_1_piece_16, mode=Mode.SUBTRACT)
    with BuildSketch(Plane(origin=(8.136310001, 4, 1.666331176), x_dir=(0, -1, 0), z_dir=(0.7454759996828609, 0, -0.6665324702494538))) as cong_1_piece_17_section:
        with BuildLine():
            CenterArc((CONG_1_R, CONG_1_R), CONG_1_R, 180, 90)
            Line((0, CONG_1_R), (0, 0))
            Line((0, 0), (CONG_1_R, 0))
        make_face()
    cong_1_piece_17 = extrude(amount=21.5, mode=Mode.PRIVATE)
    cong_1_piece_17 = split(cong_1_piece_17, bisect_by=Plane(origin=(16.833816535, 3.775199875, 0), z_dir=(0, 0, -1)), keep=Keep.TOP, mode=Mode.PRIVATE)
    add(cong_1_piece_17, mode=Mode.SUBTRACT)
    with BuildSketch(Plane(origin=(-3.866106021, 4, 1.666331176), x_dir=(0, -1, 0), z_dir=(0.7454759996828609, 0, -0.6665324702494538))) as cong_1_piece_18_section:
        with BuildLine():
            CenterArc((CONG_1_R, -CONG_1_R), CONG_1_R, 90, 90)
            Line((0, -CONG_1_R), (0, 0))
            Line((0, 0), (CONG_1_R, 0))
        make_face()
    cong_1_piece_18 = extrude(amount=30.447513082, mode=Mode.PRIVATE)
    cong_1_piece_18 = split(cong_1_piece_18, bisect_by=Plane(origin=(8.657930936, 3.772496042, 0), z_dir=(0, 0, -1)), keep=Keep.TOP, mode=Mode.PRIVATE)
    add(cong_1_piece_18, mode=Mode.SUBTRACT)
    with BuildSketch(Plane(origin=(18.831784232, -4, -18.627924932), x_dir=(0.6665324702494538, 0, 0.745475999682861), z_dir=(-0.7454759996828609, 0, 0.6665324702494538))) as cong_1_piece_19_section:
        with BuildLine():
            CenterArc((CONG_1_R, CONG_1_R), CONG_1_R, 180, 90)
            Line((0, CONG_1_R), (0, 0))
            Line((0, 0), (CONG_1_R, 0))
        make_face()
    cong_1_piece_19 = extrude(amount=30.447513082, mode=Mode.PRIVATE)
    cong_1_piece_19 = split(cong_1_piece_19, bisect_by=Plane(origin=(8.657930936, -3.772496042, 0), z_dir=(0, 0, -1)), keep=Keep.TOP, mode=Mode.PRIVATE)
    add(cong_1_piece_19, mode=Mode.SUBTRACT)

    # Congé2
    cong_2_edges = [part.edges().sort_by_distance(p)[0] for p in [
        (-10, 7, 10),
        (23.641016151, 19.562177826, 0),
        (50.782032303, 26.062177826, 0),
        (-20, 0, 10),
        (-10, -7, 10),
        (23.641016151, -19.562177826, 10),
        (50.782032303, -26.062177826, 10),
        (54.282032303, 0, 10),
        (50.782032303, 26.062177826, 10),
        (23.641016151, 19.562177826, 10),
        (54.282032303, 0, 0),
        (50.782032303, -26.062177826, 0),
        (23.641016151, -19.562177826, 0),
        (-10, -7, 0),
        (-20, 0, 0),
        (-10, 7, 0),
    ]]
    fillet(cong_2_edges, radius=CONG_2_R)


solid = part.part
